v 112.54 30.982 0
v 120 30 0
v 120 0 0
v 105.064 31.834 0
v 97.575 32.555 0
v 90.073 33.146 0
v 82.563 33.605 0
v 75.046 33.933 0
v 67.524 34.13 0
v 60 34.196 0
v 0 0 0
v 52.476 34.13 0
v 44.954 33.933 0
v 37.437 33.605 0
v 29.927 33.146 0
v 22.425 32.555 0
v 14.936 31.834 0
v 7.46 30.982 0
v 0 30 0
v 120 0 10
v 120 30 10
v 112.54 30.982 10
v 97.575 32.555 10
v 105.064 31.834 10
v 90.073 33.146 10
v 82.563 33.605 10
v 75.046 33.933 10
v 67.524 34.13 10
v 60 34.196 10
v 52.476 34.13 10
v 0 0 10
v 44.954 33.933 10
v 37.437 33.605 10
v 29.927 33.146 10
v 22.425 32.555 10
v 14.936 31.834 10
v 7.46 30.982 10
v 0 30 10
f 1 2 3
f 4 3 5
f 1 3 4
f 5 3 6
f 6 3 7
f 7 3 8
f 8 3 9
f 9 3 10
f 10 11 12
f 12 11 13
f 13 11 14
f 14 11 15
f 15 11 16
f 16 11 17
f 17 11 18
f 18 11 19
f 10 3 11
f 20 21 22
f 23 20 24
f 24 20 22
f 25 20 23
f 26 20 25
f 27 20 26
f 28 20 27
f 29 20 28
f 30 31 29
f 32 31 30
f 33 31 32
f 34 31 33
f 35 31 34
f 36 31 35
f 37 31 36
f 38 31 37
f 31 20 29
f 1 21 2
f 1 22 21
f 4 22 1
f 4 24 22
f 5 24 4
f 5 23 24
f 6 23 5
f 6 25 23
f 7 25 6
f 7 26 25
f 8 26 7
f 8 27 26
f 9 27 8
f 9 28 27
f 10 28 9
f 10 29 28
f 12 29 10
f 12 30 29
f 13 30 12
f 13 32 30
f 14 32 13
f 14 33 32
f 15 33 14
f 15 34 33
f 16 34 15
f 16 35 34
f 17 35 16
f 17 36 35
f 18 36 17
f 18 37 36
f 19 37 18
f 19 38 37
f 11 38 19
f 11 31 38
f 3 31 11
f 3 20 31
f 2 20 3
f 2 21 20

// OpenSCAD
$fn = 32;

// ----------------------------------------------------------------------
// Arc profile plate: crown, 19 points
// ----------------------------------------------------------------------

// --- parameters (mm) ---
bar_l = 120;              // bar length, X
bar_w = 30;               // bar height at the ends, Y
arc_r = 431.12;           // radius of the crown arc
arc_angle = 16;           // crown arc angle, degrees
crown_rise = 4.2;         // rise of the crown over the ends
arc_step = 1;             // sampling step of the crown arc, degrees
plate_t = 10;             // plate thickness, Z

bbox_y = bar_w + crown_rise;  // full height with the crown

profile = [[120, 30], [112.54, 30.982], [105.064, 31.834], [97.575, 32.555], [90.073, 33.146], [82.563, 33.605], [75.046, 33.933], [67.524, 34.13], [60, 34.196], [52.476, 34.13], [44.954, 33.933], [37.437, 33.605], [29.927, 33.146], [22.425, 32.555], [14.936, 31.834], [7.46, 30.982], [0, 30], [0, 0], [120, 0]];  // primary outline, 19 points, counter clockwise

// --- the one profile operation ---
linear_extrude(height = plate_t) polygon(points = profile);
